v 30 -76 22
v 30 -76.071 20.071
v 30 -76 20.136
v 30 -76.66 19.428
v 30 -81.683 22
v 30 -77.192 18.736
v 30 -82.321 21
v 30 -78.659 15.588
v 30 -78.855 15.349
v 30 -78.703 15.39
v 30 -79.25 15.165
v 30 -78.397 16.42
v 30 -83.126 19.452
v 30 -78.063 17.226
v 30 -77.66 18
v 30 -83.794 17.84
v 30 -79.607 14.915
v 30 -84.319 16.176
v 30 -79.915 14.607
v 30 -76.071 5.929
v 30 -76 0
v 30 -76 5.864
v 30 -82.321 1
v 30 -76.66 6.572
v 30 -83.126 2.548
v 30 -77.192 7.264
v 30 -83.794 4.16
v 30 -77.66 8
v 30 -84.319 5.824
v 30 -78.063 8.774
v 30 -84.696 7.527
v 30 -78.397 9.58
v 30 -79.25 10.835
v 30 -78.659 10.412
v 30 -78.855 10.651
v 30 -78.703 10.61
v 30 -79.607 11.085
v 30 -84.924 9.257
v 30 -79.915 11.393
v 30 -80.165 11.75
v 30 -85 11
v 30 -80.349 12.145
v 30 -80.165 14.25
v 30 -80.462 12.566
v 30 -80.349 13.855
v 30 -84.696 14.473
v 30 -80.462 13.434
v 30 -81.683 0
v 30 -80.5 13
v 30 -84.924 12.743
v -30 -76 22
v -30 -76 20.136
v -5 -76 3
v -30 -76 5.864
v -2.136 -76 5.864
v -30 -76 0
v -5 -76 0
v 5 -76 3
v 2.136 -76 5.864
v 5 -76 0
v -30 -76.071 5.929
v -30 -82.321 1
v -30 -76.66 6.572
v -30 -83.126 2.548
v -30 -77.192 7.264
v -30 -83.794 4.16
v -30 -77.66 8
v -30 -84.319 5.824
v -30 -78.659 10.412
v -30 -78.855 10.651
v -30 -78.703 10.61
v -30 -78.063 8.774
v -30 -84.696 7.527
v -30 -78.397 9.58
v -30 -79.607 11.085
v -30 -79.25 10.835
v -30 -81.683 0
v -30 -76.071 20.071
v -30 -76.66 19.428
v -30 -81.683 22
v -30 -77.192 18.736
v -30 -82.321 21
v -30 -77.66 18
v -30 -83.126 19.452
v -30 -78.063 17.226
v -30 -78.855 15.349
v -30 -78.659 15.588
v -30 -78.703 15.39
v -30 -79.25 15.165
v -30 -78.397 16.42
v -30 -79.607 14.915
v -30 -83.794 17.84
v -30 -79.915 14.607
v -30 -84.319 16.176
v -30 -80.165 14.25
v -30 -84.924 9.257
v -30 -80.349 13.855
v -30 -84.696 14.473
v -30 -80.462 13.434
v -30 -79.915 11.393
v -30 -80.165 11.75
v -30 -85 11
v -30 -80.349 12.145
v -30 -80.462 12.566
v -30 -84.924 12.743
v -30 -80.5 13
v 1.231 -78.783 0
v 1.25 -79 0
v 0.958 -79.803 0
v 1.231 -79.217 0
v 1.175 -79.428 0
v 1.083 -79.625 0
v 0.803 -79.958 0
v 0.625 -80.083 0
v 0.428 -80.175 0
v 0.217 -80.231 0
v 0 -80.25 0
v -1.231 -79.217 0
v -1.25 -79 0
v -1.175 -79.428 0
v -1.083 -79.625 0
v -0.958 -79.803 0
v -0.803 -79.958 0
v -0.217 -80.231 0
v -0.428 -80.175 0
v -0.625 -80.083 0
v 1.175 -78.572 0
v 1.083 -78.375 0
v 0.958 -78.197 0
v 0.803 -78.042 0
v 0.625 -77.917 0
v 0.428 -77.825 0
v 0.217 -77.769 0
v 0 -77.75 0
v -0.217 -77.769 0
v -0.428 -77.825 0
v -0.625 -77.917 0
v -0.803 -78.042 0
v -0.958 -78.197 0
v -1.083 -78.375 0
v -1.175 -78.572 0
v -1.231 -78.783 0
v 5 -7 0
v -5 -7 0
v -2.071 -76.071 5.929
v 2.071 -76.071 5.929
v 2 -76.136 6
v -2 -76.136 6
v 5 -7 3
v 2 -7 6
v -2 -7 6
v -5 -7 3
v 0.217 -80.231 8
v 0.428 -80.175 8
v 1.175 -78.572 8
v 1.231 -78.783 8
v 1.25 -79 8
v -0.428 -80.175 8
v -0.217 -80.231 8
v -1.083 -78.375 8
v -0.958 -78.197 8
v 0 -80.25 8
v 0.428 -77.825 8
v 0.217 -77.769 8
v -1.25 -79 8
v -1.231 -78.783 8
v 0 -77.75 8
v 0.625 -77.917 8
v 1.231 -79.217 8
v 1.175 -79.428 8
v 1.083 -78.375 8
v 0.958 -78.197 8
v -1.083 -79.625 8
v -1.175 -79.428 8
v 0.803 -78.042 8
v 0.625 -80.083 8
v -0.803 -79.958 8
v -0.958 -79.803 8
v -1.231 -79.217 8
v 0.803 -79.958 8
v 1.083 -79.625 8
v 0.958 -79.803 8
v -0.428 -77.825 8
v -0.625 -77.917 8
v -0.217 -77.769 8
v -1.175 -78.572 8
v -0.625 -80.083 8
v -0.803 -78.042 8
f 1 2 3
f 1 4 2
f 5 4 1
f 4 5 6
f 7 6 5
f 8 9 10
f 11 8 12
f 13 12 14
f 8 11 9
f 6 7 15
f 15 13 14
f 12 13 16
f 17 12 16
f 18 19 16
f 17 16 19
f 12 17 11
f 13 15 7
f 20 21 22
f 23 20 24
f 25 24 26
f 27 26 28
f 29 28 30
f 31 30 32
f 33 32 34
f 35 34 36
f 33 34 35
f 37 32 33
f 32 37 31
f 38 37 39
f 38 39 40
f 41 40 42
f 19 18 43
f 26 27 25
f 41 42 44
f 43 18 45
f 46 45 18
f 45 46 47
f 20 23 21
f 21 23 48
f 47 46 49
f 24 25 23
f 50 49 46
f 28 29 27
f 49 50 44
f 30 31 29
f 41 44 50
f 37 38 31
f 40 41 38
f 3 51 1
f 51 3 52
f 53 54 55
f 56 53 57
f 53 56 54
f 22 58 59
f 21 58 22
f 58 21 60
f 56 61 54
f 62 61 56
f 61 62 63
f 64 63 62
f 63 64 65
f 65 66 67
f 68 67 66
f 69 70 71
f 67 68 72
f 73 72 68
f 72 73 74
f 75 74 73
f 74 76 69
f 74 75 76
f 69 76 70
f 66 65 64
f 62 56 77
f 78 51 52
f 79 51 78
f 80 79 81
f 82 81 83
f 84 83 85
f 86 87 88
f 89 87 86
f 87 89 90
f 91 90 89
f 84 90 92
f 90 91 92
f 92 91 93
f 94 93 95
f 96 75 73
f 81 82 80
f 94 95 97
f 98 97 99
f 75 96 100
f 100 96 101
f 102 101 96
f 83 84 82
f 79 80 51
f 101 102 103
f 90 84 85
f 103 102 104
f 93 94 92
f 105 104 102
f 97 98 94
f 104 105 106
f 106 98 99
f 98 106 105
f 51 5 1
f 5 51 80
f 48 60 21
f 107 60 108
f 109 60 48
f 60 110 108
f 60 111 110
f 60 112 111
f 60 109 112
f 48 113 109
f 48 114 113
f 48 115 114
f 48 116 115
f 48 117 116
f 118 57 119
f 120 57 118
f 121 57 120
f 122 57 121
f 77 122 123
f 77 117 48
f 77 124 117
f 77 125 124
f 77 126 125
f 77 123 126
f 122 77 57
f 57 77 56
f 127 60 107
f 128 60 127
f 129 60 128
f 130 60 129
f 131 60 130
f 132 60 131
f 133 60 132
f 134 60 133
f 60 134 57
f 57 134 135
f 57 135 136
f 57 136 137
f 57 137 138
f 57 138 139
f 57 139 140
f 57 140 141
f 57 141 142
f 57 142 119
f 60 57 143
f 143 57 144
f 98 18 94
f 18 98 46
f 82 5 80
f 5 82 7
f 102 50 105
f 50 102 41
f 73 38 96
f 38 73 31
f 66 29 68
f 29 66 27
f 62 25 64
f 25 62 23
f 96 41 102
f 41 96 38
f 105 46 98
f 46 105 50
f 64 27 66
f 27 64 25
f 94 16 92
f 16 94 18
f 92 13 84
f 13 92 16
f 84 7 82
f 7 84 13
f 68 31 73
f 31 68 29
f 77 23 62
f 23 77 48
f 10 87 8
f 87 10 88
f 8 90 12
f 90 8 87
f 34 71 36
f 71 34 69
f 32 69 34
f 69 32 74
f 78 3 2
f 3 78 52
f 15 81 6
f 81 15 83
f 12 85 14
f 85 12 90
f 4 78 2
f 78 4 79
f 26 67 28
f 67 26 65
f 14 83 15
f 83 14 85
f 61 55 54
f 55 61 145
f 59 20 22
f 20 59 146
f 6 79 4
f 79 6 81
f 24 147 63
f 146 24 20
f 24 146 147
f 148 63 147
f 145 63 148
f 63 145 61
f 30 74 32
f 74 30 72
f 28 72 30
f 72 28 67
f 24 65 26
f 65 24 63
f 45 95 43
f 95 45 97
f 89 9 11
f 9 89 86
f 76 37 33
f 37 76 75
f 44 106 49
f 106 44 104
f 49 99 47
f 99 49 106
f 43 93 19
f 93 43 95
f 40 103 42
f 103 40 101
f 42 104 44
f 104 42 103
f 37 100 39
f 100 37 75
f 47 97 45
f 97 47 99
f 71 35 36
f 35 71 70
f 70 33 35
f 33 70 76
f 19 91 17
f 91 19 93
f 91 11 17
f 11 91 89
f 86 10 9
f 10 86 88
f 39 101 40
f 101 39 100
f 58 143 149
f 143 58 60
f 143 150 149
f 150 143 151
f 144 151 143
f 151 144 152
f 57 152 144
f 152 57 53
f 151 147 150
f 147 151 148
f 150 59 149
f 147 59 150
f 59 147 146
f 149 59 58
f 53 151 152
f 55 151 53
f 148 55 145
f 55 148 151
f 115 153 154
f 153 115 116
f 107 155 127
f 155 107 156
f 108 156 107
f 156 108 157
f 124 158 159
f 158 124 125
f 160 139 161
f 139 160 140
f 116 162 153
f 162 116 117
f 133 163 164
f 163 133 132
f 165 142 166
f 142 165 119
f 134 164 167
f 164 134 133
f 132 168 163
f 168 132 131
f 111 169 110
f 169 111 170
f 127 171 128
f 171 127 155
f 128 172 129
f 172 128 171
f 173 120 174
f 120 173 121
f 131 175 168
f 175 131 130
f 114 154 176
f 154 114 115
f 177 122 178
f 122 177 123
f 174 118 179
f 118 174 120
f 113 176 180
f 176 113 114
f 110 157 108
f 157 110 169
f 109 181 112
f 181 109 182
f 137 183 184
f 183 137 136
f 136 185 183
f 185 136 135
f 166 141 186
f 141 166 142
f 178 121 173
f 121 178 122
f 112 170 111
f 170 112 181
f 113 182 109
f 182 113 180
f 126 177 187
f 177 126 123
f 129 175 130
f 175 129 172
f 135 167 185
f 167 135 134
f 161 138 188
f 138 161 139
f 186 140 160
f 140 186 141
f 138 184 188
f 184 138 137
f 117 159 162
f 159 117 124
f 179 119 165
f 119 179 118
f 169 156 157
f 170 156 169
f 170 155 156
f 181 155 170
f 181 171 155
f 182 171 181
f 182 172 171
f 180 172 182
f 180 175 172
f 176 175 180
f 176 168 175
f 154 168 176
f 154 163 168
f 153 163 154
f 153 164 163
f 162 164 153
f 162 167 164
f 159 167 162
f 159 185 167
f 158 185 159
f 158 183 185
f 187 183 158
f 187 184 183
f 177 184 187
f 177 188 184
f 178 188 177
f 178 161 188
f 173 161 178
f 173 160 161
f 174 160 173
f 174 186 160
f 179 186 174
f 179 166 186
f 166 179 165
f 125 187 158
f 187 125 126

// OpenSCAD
FFF=[false,false,false];FFT=[false,false,true];
FTF=[false,true,false];FTT=[false,true,true];
TFF=[true,false,false];TFT=[true,false,true];
TTF=[true,true,false];TTT=[true,true,true];
module cube2(size, center) {
  translate([
    center[0] ? -size[0]/2 : 0,
    center[1] ? -size[1]/2 : 0,
    center[2] ? -size[2]/2 : 0]) cube(size);
}

/*
intersection() {
    translate([0,0,300-3]) rotate([0,90,0])cylinder(d=600,h=100,center=true,$fn=360);
    cube([100,40,6],true);
}
*/
module phone1() {
    
}

// hook
module top_hook() {
    module shaft() {
        intersection() {
            cube2([10,6,70],TTF);
            translate([0,5])rotate([0,0,180+45])cube2([100,100,200],FFT);
        }
    }
    difference() {
        union() {
            difference() {
                intersection() {
                    cube2([60,22,10],TFF);
                    translate([0,11,21]) rotate([0,90,0]) cylinder(d=40,h=100,center=true,$fn=72);
                }
            translate([0,13,12+5]) rotate([0,90,0])cylinder(d=20,h=100,center=true,$fn=72);
            translate([0,13,3+5]) rotate([0,90,0])cylinder(d=5,h=100,center=true,$fn=36);
            }

            translate([0,3,9]) shaft();
        }
        translate([0,8,7]) rotate([90,0,0]) cylinder(d=2.5,h=20,$fn=36);

    }
}

module bottom_hook() {
    module shaft() {
        intersection() {
            cube2([10.2,6.2,100],TTF);
            translate([0,5.1])rotate([0,0,180+45])cube2([100,100,200],FFT);
        }
    }
    difference() {
        union() {
            difference() {
                translate([0,-2,-5])cube2([60,24,15],TFF);
            translate([0,13,12+5]) rotate([0,90,0])cylinder(d=20,h=100,center=true,$fn=72);
            translate([0,13,3+5]) rotate([0,90,0])cylinder(d=5,h=100,center=true,$fn=36);
            }
            translate([0,-2])cube2([16,8,76],TFF);
        }
        translate([0,3,-1]) shaft();
        translate([0,10,5]) rotate([90,0,0]) cylinder(d=2.5,h=20,$fn=36);
    }
    
}
rotate([90-7,0,0]) 
intersection() {
    difference() {
        rotate([7,0,0]) {
            translate([0,0,86])mirror([0,0,1])top_hook();
    //        bottom_hook();
            //translate([0,13,7])color("red")cube2([100,5,72],TTF);
        }
        //screws
        for(a=[-1,1])translate([a*20,2]) {
            cylinder(d=3.2,h=30,center=true,$fn=24);
            translate([0,0,4])cylinder(d=6,h=30,$fn=24);
        }
    }
    cube2([1000,1000,1000],TTF);
}



module base() {
  r1 = (100*100+3*3)/(2*3);
  r2 = (100*100+10*10)/(2*10);
  echo(r1);
  echo(r2);

  h1=2;

  intersection() {
    union() {
      for (a=[0:0.0333:0.5]) {
        r3outer = r2+(r1-r2)*(1-a);
        r3inner = r2+(r1-r2)*a;
        difference() {
          union() {
            translate([0,r3outer+58*a])cylinder(r=r3outer,h=h1+1.5*sin(a*180),$fn=360);
          }
          translate([0,r3inner+58*(1-a)])cylinder(r=r3inner,h=20,$fn=360,center=true);
        }
      }
    }
    cube([160,200,200],true);
  }
}
